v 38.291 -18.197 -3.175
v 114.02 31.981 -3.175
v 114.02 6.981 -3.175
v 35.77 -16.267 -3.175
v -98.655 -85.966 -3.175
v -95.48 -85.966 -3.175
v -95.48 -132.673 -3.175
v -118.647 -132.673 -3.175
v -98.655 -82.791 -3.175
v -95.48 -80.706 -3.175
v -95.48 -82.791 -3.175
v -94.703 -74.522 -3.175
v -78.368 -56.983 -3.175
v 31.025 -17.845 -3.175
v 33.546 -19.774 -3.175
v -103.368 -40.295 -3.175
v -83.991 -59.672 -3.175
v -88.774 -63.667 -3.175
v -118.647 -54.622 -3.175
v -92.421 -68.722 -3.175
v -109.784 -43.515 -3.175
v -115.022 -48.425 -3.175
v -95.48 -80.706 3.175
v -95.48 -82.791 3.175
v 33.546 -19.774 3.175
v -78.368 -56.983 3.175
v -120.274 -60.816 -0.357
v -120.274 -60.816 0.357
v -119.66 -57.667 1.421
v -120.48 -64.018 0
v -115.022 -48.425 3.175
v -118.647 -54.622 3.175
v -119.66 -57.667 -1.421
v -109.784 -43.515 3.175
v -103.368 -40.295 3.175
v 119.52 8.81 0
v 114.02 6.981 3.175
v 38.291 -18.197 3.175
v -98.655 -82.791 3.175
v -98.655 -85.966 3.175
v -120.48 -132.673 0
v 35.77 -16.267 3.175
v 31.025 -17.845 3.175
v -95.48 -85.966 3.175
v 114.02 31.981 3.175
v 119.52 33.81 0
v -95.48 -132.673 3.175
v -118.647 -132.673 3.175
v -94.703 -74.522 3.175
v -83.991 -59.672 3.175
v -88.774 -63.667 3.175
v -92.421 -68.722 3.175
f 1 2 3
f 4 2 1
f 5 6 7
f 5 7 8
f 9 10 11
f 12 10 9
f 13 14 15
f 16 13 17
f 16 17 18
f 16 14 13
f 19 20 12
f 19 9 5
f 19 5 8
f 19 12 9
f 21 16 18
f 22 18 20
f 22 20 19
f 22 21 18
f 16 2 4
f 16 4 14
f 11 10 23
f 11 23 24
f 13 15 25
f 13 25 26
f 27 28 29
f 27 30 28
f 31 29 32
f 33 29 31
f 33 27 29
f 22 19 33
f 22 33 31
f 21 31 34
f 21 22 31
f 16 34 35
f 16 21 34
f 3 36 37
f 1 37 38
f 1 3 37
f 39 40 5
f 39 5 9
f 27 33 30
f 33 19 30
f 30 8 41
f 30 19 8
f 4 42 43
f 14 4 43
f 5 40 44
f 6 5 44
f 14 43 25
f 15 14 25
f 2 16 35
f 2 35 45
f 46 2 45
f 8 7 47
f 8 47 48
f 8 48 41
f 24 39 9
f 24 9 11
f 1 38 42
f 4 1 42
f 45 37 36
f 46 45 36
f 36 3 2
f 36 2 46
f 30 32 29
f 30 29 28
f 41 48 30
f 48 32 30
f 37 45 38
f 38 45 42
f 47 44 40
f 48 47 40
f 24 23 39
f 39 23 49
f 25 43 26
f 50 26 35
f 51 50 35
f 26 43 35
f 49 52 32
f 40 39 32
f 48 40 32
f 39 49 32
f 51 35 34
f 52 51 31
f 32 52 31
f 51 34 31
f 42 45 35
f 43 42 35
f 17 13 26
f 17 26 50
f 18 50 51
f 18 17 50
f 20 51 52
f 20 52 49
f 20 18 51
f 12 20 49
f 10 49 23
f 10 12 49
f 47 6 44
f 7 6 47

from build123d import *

# Parameters (mm, degrees)
BOSS_EXTRUDE1_DEPTH      = 3.175
BOSS_EXTRUDE1_DEPTH_BACK = 3.175
CUT_EXTRUDE3_DEPTH       = 206.528461822
CUT_EXTRUDE5_DEPTH       = 206.528461822
CUT_EXTRUDE6_DEPTH       = 6.35
SKETCH8_W                = 3.175
SKETCH8_H                = 3.175
CUT_EXTRUDE7_DEPTH       = 6.35


with BuildPart() as part:
    # Sketch1 → Boss-Extrude1 (new, two sides: drawn at the far end of the back side and taken through both)
    with BuildSketch(Plane.XY.offset(-BOSS_EXTRUDE1_DEPTH_BACK)):
        with BuildLine():
            Line((-95.480291898, -80.706386575), (-95.480291898, -131.085242165))
            Line((-95.480291898, -131.085242165), (-95.480291898, -132.672742165))
            Line((-95.480291898, -132.672742165), (-120.480291898, -132.672742165))
            Line((-120.480291898, -132.672742165), (-120.480291898, -131.085242165))
            Line((-120.480291898, -131.085242165), (-120.480291898, -64.018285781))
            ThreePointArc((-120.480291898, -64.018285781), (-115.755703828, -49.392703021), (-103.367678212, -40.295108567))
            Line((-103.367678212, -40.295108567), (119.519708102, 33.809591006))
            Line((119.519708102, 33.809591006), (119.519708102, 8.809591006))
            Line((119.519708102, 8.809591006), (-78.367678212, -56.983209361))
            ThreePointArc((-78.367678212, -56.983209361), (-90.755703828, -66.080803815), (-95.480291898, -80.706386575))
        make_face()
    extrude(amount=BOSS_EXTRUDE1_DEPTH + BOSS_EXTRUDE1_DEPTH_BACK)

    # Sketch2 → Cut-Extrude3 (cut, through all)
    with BuildSketch(Plane.XZ.offset(132.672742165)):
        Polygon((-120.480291898, 0), (-120.480291898, 3.175), (-118.647204793, 3.175), align=None)
    cut_extrude3 = extrude(amount=-CUT_EXTRUDE3_DEPTH, mode=Mode.SUBTRACT)

    # Mirror3: Cut-Extrude3 across plane
    add(cut_extrude3.mirror(Plane.XY), mode=Mode.SUBTRACT)

    # Sketch3 → Cut-Extrude5 (cut, through all)
    with BuildSketch(Plane.XZ.offset(132.672742165)):
        Polygon((119.519708102, 3.175), (114.020446788, 3.175), (119.519708102, 0), align=None)
    cut_extrude5 = extrude(amount=-CUT_EXTRUDE5_DEPTH, mode=Mode.SUBTRACT)

    # Mirror4: Cut-Extrude5 across plane
    add(cut_extrude5.mirror(Plane.XY), mode=Mode.SUBTRACT)

    # Sketch6 → Cut-Extrude6 (cut)
    with BuildSketch(Plane.XY.offset(3.175)):
        Polygon((33.546459297, -19.774448133), (38.29109474, -18.19697087), (35.769730347, -16.267373348), (31.025094904, -17.844850611), align=None)
    extrude(amount=-CUT_EXTRUDE6_DEPTH, mode=Mode.SUBTRACT)

    # Sketch8 → Cut-Extrude7 (cut)
    with BuildSketch(Plane.XY.offset(3.175)):
        with Locations((-97.067791898, -84.378992165)):
            Rectangle(SKETCH8_W, SKETCH8_H)
    extrude(amount=-CUT_EXTRUDE7_DEPTH, mode=Mode.SUBTRACT)


solid = part.part
